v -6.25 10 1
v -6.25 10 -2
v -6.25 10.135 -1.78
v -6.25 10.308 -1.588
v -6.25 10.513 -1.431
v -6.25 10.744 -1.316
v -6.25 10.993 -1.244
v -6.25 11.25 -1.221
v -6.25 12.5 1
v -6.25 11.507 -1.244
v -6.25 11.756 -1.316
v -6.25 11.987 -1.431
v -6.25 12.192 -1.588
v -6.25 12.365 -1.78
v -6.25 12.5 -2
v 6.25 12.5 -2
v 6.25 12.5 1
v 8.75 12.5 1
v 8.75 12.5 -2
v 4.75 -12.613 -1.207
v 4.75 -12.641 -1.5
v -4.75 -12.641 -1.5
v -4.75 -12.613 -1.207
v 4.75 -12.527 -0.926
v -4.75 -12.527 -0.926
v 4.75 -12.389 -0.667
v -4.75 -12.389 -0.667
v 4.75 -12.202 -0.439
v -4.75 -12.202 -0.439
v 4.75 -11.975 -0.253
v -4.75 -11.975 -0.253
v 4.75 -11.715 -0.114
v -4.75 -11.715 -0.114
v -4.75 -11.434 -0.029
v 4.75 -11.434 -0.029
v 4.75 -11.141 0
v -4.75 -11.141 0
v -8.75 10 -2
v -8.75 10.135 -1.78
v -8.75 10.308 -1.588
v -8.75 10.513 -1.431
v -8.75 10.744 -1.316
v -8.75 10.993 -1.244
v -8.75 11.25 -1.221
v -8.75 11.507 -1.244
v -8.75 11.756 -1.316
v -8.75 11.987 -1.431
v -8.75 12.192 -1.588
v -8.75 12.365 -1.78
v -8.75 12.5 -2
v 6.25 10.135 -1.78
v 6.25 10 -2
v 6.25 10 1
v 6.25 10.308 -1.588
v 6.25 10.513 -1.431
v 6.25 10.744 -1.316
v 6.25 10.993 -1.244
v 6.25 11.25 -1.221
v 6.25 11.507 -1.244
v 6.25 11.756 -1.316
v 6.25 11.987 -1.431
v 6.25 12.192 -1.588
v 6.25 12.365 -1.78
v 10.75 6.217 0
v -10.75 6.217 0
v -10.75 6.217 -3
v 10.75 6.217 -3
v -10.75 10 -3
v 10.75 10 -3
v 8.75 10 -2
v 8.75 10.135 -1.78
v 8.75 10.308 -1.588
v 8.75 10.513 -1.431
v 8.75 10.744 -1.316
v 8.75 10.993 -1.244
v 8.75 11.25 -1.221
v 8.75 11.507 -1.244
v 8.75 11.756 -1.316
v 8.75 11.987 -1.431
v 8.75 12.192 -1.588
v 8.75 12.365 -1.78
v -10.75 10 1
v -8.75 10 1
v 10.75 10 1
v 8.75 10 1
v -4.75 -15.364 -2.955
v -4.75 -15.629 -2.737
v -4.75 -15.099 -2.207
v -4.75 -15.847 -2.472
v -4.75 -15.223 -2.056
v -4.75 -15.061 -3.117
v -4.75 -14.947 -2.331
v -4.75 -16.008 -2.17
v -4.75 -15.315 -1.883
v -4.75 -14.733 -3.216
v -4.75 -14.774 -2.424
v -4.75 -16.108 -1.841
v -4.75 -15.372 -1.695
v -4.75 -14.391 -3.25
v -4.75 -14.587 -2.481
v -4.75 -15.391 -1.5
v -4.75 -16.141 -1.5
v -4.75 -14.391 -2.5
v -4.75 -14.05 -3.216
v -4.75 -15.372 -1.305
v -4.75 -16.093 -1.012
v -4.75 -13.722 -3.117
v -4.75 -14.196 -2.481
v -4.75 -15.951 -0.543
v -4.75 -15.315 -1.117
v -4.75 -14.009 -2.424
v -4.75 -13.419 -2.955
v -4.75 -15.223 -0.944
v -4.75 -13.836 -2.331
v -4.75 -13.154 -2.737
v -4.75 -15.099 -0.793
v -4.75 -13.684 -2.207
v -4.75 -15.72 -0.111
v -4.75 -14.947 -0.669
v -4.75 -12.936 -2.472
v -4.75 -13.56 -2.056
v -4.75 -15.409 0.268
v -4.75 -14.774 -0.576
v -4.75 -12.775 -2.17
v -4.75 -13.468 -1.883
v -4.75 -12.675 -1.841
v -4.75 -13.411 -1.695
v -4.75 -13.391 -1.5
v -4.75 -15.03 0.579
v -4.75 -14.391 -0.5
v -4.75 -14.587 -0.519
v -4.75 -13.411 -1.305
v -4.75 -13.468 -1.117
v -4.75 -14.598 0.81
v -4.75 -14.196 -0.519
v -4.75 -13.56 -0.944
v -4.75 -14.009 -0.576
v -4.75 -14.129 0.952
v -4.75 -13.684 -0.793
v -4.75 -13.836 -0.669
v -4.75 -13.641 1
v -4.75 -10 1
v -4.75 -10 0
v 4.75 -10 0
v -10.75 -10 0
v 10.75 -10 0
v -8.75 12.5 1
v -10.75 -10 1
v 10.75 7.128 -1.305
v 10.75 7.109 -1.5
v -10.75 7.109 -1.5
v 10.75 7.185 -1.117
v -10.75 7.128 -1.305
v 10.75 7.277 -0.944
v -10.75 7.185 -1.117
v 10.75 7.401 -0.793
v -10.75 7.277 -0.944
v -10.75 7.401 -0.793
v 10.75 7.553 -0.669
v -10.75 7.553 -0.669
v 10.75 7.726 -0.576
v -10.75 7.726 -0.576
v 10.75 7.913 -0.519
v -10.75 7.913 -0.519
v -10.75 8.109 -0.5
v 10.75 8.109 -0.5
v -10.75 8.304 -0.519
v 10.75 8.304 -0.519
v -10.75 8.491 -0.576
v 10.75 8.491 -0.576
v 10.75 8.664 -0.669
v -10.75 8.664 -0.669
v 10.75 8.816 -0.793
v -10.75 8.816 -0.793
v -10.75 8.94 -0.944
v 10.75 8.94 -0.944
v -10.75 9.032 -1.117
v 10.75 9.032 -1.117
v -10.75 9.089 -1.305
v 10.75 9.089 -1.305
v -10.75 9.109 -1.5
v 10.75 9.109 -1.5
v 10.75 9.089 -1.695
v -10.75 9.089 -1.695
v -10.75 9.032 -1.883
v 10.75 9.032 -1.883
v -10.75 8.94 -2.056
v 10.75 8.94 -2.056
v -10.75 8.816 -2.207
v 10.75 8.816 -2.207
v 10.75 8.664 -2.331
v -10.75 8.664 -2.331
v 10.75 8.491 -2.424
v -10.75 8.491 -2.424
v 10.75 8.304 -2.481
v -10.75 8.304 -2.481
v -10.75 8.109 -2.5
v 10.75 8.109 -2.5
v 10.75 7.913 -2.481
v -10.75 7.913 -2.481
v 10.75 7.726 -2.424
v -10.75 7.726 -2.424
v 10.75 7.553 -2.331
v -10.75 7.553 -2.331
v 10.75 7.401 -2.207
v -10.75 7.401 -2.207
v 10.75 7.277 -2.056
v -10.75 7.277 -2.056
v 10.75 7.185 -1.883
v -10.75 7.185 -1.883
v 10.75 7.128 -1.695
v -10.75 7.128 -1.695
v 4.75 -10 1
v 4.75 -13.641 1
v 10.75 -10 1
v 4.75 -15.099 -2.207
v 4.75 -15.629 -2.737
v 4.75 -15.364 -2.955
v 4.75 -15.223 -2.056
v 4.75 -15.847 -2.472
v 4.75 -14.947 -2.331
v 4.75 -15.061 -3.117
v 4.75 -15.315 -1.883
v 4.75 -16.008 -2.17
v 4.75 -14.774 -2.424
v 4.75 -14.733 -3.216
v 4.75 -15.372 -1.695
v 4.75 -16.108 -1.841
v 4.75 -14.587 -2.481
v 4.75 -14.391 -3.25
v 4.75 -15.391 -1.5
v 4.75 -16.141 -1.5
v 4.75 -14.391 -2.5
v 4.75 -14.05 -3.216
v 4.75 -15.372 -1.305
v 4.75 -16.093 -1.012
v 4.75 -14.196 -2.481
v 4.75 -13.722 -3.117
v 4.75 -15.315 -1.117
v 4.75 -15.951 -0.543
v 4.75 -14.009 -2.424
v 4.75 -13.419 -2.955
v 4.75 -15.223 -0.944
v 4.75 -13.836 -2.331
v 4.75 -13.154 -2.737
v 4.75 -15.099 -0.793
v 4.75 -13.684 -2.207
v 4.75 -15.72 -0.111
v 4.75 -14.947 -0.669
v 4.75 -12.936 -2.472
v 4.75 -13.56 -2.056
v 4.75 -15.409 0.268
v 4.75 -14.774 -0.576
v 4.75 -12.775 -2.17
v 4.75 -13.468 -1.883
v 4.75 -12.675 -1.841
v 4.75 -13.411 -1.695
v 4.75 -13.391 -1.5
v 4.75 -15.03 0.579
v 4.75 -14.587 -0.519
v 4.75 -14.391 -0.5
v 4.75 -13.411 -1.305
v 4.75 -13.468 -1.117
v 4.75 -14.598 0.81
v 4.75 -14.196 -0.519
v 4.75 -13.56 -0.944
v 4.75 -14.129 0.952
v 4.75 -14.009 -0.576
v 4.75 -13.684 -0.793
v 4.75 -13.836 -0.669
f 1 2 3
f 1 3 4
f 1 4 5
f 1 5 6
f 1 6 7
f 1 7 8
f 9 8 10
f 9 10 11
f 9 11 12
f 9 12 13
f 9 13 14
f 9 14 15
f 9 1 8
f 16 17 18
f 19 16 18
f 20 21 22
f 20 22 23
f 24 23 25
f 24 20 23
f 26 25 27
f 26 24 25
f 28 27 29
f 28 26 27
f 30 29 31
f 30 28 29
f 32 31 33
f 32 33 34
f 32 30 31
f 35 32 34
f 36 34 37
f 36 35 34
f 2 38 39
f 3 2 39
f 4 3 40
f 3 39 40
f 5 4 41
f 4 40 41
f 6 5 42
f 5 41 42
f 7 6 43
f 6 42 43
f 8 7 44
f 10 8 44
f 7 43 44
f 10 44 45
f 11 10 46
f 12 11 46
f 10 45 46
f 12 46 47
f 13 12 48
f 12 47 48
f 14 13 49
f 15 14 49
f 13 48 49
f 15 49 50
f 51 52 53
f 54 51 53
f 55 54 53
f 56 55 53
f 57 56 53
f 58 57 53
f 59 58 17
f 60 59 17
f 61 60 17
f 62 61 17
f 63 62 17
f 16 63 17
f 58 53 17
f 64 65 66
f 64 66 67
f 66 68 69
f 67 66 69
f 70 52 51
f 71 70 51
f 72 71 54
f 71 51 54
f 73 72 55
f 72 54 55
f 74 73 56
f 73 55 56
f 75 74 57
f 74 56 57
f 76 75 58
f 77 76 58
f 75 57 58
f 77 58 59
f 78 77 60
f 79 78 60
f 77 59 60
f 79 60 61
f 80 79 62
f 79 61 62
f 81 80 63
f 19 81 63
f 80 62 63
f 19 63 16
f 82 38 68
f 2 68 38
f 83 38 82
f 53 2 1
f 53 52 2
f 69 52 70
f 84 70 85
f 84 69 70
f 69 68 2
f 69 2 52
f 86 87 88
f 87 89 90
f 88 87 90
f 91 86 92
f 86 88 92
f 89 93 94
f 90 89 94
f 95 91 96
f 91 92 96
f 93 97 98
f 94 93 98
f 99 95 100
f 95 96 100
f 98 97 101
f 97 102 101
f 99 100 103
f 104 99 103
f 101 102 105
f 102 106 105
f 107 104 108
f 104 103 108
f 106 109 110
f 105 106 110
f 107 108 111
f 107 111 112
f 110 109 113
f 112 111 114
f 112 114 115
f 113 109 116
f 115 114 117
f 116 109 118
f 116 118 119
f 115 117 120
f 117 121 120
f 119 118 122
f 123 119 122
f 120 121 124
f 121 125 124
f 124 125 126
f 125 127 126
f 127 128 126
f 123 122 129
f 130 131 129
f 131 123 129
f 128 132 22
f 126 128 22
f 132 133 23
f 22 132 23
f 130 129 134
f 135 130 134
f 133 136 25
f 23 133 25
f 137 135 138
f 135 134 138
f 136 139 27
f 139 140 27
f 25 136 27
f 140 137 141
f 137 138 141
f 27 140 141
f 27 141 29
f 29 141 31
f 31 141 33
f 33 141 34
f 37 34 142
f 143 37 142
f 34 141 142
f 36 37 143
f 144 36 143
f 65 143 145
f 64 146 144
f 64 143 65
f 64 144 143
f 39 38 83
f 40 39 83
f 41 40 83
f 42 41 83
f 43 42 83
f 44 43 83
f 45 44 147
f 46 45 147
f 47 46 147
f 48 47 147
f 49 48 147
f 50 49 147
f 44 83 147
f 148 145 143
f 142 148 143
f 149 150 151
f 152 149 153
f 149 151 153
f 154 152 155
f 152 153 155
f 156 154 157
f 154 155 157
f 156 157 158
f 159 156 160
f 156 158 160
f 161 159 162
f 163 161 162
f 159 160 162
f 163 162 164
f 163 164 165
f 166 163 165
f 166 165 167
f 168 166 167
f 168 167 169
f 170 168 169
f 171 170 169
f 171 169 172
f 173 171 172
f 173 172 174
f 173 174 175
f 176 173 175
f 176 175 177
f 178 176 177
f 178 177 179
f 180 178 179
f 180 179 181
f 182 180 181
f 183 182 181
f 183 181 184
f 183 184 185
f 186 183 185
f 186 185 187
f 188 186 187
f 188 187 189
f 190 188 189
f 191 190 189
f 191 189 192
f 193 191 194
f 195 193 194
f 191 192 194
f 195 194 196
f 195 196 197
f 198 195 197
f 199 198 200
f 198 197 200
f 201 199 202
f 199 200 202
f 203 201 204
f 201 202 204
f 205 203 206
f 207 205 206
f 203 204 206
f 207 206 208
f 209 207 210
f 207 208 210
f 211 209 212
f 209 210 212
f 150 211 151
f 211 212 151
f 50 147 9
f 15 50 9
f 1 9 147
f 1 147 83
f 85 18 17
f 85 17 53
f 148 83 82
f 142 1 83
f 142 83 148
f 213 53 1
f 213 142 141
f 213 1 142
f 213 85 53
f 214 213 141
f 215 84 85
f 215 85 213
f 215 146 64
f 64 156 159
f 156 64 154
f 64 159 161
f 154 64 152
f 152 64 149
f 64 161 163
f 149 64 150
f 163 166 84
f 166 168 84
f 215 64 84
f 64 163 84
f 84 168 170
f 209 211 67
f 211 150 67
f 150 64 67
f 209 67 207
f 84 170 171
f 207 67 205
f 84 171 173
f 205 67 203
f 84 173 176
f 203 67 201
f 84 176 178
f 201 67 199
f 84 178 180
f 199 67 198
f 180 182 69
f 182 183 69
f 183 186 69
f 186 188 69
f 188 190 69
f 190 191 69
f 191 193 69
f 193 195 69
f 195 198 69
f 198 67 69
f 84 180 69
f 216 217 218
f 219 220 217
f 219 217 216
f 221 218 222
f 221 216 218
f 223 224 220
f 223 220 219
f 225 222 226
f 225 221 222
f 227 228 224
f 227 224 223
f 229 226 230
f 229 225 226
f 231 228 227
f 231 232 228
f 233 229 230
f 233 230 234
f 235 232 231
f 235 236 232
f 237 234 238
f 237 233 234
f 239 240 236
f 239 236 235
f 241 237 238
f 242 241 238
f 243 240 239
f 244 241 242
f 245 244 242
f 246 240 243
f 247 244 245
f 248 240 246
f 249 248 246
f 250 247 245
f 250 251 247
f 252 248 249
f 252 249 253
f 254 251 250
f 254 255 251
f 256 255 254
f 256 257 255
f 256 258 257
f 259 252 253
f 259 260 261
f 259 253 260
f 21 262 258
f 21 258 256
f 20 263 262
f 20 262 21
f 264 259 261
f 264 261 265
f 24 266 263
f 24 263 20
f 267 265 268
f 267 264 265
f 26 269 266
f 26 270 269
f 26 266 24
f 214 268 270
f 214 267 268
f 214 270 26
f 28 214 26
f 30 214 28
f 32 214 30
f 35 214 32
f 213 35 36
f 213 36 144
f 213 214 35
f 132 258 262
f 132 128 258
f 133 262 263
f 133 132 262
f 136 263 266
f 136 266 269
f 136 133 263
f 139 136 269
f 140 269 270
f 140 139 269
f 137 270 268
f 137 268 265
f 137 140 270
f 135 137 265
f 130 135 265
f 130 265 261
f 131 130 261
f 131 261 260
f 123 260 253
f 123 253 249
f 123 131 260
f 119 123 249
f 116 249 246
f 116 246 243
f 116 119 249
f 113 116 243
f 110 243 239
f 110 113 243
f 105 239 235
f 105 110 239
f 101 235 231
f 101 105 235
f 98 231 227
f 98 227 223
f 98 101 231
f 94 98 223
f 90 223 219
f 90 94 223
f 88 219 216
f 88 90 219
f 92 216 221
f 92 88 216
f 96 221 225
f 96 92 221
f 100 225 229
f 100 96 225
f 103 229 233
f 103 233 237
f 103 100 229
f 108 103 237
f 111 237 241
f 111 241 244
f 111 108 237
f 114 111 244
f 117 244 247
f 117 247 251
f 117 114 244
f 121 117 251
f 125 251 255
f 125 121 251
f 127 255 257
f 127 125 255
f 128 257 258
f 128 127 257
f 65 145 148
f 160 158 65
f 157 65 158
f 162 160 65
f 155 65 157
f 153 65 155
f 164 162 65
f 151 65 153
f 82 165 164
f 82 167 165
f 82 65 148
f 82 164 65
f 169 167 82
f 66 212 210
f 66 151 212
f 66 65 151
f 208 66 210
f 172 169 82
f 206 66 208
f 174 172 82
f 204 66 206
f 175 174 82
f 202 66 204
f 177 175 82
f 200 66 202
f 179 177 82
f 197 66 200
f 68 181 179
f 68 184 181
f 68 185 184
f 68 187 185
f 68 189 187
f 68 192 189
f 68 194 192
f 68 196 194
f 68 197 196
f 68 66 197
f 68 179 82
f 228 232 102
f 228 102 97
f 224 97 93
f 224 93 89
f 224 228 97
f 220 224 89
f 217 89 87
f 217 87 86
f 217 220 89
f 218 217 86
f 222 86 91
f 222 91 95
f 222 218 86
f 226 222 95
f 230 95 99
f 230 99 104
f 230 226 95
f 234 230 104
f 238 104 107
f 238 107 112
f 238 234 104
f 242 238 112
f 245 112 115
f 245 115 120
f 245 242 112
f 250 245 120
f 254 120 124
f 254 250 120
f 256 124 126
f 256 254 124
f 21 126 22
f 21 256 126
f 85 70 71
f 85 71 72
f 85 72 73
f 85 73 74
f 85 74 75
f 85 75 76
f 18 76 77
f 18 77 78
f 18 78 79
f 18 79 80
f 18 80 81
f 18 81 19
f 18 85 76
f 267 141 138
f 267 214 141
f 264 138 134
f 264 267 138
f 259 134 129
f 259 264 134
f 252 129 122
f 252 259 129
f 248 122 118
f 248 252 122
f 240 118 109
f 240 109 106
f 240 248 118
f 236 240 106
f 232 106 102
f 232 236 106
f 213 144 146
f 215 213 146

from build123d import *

# Parameters (mm, degrees)
F1_W      = 21.5
F1_H      = 3.7829035334
F2_DEPTH  = 3
F0_W      = 21.5
F0_H      = 20
F3_DEPTH  = 1
F4_R      = 1
F5_DEPTH  = 21.5
F6_R      = 1
F7_DEPTH  = 4.75
F8_W      = 2.5
F8_H      = 2.5
F9_DEPTH  = 3
F11_DEPTH = 25


with BuildPart() as f2:
    # F1 (on face) → F2 (new body)
    with BuildSketch(Plane.XY):
        with Locations((0, 8.1085482333)):
            Rectangle(F1_W, F1_H)
    extrude(amount=-F2_DEPTH)

    # F0 (on Top) → F3 (join)
    with BuildSketch(Plane.XY):
        Rectangle(F0_W, F0_H)
    extrude(amount=F3_DEPTH)

    # F4 (on face) → F5 (cut)
    with BuildSketch(Plane(origin=(-10.75, 0, 0), x_dir=(0, -1, 0), z_dir=(-1, 0, 0))):
        with Locations((-8.1085482333, -1.5)):
            Circle(F4_R)
    extrude(amount=-F5_DEPTH, mode=Mode.SUBTRACT)

    # F6 (on Right) → F7 (join, symmetric)
    with BuildSketch(Plane.YZ):
        with BuildLine():
            ThreePointArc((-13.6414517667, 1), (-15.4092187197, 0.267766953), (-16.1414517667, -1.5))
            ThreePointArc((-16.1414517667, -1.5), (-14.3914517667, -3.25), (-12.6414517667, -1.5))
            ThreePointArc((-12.6414517667, -1.5), (-12.2021119385, -0.4393398282), (-11.1414517667, 0))
            Line((-11.1414517667, 0), (-10, 0))
            Line((-10, 0), (-10, 1))
            Line((-10, 1), (-13.6414517667, 1))
        make_face()
        with Locations((-14.3914517667, -1.5)):
            Circle(F6_R, mode=Mode.SUBTRACT)
        Polygon((10, 1), (-10, 1), (-10, 0), (6.2170964666, 0), (6.2170964666, -3), (10, -3), align=None)
        with Locations((8.1085482333, -1.5)):
            Circle(F6_R, mode=Mode.SUBTRACT)
    extrude(amount=F7_DEPTH, both=True)

    # F8 (on face) → F9 (join)
    with BuildSketch(Plane.XY.offset(1)):
        with Locations((-7.5, 11.25)):
            Rectangle(F8_W, F8_H)
        with Locations((7.5, 11.25)):
            Rectangle(F8_W, F8_H)
    extrude(amount=-F9_DEPTH)

    # F10 (on face) → F11 (cut)
    with BuildSketch(Plane(origin=(-8.75, 0, 0), x_dir=(0, -1, 0), z_dir=(-1, 0, 0))):
        with BuildLine():
            Line((-12.5, -2), (-10, -2))
            ThreePointArc((-10, -2), (-11.25, -1.2205063265), (-12.5, -2))
        make_face()
    extrude(amount=-F11_DEPTH, mode=Mode.SUBTRACT)


solid = f2.part
